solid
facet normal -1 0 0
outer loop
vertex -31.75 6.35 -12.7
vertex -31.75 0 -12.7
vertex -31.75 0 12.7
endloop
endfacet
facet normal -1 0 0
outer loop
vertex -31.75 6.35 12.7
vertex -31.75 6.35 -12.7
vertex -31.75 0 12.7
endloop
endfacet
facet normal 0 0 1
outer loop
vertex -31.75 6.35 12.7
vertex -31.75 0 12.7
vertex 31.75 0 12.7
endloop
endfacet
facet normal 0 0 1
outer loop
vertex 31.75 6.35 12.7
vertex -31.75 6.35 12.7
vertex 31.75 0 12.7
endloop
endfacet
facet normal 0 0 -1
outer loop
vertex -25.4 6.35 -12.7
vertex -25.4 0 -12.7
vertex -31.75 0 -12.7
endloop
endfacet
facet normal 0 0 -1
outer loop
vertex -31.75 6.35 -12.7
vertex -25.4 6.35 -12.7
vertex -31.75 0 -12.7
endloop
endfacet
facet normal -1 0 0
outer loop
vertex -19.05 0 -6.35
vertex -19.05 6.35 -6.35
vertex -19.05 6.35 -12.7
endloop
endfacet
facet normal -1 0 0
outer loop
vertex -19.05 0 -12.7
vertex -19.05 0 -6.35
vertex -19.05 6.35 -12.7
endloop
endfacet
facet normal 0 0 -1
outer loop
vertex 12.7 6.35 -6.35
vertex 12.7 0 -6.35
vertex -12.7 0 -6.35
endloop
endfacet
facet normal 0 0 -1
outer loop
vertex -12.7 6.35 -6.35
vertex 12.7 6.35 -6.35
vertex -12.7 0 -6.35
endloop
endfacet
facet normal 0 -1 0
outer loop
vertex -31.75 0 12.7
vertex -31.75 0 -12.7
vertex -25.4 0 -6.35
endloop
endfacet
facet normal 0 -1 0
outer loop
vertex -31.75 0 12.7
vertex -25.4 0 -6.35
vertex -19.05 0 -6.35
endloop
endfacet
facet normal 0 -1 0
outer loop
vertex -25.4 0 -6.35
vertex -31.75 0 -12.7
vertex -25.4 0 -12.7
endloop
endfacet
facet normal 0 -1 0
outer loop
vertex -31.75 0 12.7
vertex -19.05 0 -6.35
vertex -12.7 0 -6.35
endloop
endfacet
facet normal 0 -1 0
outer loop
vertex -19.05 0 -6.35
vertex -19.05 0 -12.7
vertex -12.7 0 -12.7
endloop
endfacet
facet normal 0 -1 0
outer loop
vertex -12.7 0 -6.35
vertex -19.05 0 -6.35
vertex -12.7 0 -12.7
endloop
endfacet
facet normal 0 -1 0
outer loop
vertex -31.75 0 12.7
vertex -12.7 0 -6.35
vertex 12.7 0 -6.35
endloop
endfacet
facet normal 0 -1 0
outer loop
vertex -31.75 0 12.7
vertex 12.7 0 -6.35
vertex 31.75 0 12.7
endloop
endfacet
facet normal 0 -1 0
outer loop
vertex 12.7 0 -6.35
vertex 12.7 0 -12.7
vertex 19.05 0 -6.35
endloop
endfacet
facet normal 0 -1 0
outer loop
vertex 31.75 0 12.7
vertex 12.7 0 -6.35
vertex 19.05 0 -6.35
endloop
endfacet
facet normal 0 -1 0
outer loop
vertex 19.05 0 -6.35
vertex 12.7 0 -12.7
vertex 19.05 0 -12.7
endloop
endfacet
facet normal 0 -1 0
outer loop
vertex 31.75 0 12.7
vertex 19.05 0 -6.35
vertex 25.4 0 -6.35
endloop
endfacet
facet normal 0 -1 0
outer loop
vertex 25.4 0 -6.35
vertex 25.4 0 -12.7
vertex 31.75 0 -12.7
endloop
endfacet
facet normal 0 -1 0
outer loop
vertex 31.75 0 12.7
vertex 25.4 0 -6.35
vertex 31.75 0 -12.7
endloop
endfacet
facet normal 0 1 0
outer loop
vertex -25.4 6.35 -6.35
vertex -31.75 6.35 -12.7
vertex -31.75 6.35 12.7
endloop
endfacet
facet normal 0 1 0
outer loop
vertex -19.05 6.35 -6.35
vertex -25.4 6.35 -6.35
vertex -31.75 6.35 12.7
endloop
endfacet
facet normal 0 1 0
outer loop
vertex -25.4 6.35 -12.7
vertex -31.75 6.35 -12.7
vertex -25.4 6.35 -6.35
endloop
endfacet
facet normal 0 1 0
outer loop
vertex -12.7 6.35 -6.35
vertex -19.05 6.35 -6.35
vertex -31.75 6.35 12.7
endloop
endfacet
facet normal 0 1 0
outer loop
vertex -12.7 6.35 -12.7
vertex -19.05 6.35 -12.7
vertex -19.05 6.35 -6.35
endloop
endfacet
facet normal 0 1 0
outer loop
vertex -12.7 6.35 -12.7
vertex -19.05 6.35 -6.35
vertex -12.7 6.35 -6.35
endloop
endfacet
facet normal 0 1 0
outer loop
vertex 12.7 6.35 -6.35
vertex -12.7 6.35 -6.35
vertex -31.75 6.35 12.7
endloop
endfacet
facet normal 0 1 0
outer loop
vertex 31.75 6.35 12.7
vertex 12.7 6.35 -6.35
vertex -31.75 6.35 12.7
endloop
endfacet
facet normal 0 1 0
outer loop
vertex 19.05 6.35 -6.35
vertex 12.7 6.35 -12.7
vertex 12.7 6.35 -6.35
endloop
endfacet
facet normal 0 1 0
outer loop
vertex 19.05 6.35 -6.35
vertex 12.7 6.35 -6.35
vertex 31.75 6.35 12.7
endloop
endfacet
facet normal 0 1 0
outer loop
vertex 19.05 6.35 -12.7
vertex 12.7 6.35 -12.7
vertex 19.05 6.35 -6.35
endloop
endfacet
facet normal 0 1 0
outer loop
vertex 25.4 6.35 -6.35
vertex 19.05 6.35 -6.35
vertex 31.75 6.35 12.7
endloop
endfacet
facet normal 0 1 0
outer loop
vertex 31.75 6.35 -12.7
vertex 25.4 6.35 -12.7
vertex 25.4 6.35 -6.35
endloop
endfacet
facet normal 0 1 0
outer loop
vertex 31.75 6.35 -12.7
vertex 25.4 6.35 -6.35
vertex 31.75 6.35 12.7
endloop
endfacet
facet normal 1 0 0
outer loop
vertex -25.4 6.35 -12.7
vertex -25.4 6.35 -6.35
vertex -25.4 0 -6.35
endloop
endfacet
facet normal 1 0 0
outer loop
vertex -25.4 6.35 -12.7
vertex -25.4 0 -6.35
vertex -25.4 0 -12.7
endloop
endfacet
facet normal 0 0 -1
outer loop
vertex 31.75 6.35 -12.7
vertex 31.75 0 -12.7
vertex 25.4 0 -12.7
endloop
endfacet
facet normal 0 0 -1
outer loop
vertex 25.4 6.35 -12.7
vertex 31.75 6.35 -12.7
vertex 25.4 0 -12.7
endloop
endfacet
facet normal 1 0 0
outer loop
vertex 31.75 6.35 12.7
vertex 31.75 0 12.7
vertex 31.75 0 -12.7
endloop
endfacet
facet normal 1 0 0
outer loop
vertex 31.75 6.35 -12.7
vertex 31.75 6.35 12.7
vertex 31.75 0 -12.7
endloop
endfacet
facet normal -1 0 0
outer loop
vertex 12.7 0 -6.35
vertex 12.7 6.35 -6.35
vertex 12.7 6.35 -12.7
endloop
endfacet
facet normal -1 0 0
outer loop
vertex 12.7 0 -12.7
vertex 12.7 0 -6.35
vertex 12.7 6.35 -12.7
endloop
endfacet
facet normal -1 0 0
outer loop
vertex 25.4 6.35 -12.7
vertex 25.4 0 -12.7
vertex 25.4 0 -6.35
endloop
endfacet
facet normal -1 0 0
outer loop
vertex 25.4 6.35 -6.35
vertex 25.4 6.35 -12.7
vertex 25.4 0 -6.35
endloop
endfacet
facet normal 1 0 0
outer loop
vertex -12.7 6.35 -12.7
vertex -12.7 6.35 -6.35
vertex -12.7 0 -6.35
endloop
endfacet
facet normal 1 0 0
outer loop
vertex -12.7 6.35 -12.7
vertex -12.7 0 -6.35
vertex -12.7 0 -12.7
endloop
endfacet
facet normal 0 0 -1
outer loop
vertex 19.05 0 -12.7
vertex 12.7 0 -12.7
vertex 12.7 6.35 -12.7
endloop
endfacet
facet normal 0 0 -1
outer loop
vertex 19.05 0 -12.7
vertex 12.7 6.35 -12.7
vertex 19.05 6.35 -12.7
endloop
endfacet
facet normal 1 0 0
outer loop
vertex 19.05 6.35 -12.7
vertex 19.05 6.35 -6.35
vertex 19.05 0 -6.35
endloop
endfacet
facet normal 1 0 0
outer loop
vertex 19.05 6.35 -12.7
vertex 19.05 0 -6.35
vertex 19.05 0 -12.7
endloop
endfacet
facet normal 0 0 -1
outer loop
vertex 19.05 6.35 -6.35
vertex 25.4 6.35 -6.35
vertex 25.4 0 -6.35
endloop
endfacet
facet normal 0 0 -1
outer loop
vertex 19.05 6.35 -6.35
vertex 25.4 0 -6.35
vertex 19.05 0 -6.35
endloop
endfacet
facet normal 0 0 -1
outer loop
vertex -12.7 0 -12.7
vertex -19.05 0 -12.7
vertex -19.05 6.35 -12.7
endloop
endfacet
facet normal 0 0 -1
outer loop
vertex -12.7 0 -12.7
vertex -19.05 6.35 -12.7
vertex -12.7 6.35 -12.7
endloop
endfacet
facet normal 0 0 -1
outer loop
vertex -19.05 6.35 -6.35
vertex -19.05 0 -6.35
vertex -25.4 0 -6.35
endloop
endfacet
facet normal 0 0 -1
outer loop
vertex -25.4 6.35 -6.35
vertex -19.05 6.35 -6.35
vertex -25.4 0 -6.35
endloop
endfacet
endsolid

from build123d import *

# Parameters (mm, degrees)
SKETCH1_W           = 6.35
SKETCH1_H           = 6.35
BOSS_EXTRUDE1_DEPTH = 6.35


with BuildPart() as part:
    # Sketch1 → Boss-Extrude1 (new body)
    with BuildSketch(Plane(origin=(0, 0, 0), x_dir=(1, 0, 0), z_dir=(0, 1, 0))):
        Polygon((-31.75, 12.7), (-31.75, -12.7), (31.75, -12.7), (31.75, 12.7), (25.4, 12.7), (25.4, 6.35), (19.05, 6.35), (12.7, 6.35), (-12.7, 6.35), (-19.05, 6.35), (-25.4, 6.35), (-25.4, 12.7), align=None)
        with Locations((-15.875, 9.525)):
            Rectangle(SKETCH1_W, SKETCH1_H)
        with Locations((15.875, 9.525)):
            Rectangle(SKETCH1_W, SKETCH1_H)
    extrude(amount=BOSS_EXTRUDE1_DEPTH)


solid = part.part
